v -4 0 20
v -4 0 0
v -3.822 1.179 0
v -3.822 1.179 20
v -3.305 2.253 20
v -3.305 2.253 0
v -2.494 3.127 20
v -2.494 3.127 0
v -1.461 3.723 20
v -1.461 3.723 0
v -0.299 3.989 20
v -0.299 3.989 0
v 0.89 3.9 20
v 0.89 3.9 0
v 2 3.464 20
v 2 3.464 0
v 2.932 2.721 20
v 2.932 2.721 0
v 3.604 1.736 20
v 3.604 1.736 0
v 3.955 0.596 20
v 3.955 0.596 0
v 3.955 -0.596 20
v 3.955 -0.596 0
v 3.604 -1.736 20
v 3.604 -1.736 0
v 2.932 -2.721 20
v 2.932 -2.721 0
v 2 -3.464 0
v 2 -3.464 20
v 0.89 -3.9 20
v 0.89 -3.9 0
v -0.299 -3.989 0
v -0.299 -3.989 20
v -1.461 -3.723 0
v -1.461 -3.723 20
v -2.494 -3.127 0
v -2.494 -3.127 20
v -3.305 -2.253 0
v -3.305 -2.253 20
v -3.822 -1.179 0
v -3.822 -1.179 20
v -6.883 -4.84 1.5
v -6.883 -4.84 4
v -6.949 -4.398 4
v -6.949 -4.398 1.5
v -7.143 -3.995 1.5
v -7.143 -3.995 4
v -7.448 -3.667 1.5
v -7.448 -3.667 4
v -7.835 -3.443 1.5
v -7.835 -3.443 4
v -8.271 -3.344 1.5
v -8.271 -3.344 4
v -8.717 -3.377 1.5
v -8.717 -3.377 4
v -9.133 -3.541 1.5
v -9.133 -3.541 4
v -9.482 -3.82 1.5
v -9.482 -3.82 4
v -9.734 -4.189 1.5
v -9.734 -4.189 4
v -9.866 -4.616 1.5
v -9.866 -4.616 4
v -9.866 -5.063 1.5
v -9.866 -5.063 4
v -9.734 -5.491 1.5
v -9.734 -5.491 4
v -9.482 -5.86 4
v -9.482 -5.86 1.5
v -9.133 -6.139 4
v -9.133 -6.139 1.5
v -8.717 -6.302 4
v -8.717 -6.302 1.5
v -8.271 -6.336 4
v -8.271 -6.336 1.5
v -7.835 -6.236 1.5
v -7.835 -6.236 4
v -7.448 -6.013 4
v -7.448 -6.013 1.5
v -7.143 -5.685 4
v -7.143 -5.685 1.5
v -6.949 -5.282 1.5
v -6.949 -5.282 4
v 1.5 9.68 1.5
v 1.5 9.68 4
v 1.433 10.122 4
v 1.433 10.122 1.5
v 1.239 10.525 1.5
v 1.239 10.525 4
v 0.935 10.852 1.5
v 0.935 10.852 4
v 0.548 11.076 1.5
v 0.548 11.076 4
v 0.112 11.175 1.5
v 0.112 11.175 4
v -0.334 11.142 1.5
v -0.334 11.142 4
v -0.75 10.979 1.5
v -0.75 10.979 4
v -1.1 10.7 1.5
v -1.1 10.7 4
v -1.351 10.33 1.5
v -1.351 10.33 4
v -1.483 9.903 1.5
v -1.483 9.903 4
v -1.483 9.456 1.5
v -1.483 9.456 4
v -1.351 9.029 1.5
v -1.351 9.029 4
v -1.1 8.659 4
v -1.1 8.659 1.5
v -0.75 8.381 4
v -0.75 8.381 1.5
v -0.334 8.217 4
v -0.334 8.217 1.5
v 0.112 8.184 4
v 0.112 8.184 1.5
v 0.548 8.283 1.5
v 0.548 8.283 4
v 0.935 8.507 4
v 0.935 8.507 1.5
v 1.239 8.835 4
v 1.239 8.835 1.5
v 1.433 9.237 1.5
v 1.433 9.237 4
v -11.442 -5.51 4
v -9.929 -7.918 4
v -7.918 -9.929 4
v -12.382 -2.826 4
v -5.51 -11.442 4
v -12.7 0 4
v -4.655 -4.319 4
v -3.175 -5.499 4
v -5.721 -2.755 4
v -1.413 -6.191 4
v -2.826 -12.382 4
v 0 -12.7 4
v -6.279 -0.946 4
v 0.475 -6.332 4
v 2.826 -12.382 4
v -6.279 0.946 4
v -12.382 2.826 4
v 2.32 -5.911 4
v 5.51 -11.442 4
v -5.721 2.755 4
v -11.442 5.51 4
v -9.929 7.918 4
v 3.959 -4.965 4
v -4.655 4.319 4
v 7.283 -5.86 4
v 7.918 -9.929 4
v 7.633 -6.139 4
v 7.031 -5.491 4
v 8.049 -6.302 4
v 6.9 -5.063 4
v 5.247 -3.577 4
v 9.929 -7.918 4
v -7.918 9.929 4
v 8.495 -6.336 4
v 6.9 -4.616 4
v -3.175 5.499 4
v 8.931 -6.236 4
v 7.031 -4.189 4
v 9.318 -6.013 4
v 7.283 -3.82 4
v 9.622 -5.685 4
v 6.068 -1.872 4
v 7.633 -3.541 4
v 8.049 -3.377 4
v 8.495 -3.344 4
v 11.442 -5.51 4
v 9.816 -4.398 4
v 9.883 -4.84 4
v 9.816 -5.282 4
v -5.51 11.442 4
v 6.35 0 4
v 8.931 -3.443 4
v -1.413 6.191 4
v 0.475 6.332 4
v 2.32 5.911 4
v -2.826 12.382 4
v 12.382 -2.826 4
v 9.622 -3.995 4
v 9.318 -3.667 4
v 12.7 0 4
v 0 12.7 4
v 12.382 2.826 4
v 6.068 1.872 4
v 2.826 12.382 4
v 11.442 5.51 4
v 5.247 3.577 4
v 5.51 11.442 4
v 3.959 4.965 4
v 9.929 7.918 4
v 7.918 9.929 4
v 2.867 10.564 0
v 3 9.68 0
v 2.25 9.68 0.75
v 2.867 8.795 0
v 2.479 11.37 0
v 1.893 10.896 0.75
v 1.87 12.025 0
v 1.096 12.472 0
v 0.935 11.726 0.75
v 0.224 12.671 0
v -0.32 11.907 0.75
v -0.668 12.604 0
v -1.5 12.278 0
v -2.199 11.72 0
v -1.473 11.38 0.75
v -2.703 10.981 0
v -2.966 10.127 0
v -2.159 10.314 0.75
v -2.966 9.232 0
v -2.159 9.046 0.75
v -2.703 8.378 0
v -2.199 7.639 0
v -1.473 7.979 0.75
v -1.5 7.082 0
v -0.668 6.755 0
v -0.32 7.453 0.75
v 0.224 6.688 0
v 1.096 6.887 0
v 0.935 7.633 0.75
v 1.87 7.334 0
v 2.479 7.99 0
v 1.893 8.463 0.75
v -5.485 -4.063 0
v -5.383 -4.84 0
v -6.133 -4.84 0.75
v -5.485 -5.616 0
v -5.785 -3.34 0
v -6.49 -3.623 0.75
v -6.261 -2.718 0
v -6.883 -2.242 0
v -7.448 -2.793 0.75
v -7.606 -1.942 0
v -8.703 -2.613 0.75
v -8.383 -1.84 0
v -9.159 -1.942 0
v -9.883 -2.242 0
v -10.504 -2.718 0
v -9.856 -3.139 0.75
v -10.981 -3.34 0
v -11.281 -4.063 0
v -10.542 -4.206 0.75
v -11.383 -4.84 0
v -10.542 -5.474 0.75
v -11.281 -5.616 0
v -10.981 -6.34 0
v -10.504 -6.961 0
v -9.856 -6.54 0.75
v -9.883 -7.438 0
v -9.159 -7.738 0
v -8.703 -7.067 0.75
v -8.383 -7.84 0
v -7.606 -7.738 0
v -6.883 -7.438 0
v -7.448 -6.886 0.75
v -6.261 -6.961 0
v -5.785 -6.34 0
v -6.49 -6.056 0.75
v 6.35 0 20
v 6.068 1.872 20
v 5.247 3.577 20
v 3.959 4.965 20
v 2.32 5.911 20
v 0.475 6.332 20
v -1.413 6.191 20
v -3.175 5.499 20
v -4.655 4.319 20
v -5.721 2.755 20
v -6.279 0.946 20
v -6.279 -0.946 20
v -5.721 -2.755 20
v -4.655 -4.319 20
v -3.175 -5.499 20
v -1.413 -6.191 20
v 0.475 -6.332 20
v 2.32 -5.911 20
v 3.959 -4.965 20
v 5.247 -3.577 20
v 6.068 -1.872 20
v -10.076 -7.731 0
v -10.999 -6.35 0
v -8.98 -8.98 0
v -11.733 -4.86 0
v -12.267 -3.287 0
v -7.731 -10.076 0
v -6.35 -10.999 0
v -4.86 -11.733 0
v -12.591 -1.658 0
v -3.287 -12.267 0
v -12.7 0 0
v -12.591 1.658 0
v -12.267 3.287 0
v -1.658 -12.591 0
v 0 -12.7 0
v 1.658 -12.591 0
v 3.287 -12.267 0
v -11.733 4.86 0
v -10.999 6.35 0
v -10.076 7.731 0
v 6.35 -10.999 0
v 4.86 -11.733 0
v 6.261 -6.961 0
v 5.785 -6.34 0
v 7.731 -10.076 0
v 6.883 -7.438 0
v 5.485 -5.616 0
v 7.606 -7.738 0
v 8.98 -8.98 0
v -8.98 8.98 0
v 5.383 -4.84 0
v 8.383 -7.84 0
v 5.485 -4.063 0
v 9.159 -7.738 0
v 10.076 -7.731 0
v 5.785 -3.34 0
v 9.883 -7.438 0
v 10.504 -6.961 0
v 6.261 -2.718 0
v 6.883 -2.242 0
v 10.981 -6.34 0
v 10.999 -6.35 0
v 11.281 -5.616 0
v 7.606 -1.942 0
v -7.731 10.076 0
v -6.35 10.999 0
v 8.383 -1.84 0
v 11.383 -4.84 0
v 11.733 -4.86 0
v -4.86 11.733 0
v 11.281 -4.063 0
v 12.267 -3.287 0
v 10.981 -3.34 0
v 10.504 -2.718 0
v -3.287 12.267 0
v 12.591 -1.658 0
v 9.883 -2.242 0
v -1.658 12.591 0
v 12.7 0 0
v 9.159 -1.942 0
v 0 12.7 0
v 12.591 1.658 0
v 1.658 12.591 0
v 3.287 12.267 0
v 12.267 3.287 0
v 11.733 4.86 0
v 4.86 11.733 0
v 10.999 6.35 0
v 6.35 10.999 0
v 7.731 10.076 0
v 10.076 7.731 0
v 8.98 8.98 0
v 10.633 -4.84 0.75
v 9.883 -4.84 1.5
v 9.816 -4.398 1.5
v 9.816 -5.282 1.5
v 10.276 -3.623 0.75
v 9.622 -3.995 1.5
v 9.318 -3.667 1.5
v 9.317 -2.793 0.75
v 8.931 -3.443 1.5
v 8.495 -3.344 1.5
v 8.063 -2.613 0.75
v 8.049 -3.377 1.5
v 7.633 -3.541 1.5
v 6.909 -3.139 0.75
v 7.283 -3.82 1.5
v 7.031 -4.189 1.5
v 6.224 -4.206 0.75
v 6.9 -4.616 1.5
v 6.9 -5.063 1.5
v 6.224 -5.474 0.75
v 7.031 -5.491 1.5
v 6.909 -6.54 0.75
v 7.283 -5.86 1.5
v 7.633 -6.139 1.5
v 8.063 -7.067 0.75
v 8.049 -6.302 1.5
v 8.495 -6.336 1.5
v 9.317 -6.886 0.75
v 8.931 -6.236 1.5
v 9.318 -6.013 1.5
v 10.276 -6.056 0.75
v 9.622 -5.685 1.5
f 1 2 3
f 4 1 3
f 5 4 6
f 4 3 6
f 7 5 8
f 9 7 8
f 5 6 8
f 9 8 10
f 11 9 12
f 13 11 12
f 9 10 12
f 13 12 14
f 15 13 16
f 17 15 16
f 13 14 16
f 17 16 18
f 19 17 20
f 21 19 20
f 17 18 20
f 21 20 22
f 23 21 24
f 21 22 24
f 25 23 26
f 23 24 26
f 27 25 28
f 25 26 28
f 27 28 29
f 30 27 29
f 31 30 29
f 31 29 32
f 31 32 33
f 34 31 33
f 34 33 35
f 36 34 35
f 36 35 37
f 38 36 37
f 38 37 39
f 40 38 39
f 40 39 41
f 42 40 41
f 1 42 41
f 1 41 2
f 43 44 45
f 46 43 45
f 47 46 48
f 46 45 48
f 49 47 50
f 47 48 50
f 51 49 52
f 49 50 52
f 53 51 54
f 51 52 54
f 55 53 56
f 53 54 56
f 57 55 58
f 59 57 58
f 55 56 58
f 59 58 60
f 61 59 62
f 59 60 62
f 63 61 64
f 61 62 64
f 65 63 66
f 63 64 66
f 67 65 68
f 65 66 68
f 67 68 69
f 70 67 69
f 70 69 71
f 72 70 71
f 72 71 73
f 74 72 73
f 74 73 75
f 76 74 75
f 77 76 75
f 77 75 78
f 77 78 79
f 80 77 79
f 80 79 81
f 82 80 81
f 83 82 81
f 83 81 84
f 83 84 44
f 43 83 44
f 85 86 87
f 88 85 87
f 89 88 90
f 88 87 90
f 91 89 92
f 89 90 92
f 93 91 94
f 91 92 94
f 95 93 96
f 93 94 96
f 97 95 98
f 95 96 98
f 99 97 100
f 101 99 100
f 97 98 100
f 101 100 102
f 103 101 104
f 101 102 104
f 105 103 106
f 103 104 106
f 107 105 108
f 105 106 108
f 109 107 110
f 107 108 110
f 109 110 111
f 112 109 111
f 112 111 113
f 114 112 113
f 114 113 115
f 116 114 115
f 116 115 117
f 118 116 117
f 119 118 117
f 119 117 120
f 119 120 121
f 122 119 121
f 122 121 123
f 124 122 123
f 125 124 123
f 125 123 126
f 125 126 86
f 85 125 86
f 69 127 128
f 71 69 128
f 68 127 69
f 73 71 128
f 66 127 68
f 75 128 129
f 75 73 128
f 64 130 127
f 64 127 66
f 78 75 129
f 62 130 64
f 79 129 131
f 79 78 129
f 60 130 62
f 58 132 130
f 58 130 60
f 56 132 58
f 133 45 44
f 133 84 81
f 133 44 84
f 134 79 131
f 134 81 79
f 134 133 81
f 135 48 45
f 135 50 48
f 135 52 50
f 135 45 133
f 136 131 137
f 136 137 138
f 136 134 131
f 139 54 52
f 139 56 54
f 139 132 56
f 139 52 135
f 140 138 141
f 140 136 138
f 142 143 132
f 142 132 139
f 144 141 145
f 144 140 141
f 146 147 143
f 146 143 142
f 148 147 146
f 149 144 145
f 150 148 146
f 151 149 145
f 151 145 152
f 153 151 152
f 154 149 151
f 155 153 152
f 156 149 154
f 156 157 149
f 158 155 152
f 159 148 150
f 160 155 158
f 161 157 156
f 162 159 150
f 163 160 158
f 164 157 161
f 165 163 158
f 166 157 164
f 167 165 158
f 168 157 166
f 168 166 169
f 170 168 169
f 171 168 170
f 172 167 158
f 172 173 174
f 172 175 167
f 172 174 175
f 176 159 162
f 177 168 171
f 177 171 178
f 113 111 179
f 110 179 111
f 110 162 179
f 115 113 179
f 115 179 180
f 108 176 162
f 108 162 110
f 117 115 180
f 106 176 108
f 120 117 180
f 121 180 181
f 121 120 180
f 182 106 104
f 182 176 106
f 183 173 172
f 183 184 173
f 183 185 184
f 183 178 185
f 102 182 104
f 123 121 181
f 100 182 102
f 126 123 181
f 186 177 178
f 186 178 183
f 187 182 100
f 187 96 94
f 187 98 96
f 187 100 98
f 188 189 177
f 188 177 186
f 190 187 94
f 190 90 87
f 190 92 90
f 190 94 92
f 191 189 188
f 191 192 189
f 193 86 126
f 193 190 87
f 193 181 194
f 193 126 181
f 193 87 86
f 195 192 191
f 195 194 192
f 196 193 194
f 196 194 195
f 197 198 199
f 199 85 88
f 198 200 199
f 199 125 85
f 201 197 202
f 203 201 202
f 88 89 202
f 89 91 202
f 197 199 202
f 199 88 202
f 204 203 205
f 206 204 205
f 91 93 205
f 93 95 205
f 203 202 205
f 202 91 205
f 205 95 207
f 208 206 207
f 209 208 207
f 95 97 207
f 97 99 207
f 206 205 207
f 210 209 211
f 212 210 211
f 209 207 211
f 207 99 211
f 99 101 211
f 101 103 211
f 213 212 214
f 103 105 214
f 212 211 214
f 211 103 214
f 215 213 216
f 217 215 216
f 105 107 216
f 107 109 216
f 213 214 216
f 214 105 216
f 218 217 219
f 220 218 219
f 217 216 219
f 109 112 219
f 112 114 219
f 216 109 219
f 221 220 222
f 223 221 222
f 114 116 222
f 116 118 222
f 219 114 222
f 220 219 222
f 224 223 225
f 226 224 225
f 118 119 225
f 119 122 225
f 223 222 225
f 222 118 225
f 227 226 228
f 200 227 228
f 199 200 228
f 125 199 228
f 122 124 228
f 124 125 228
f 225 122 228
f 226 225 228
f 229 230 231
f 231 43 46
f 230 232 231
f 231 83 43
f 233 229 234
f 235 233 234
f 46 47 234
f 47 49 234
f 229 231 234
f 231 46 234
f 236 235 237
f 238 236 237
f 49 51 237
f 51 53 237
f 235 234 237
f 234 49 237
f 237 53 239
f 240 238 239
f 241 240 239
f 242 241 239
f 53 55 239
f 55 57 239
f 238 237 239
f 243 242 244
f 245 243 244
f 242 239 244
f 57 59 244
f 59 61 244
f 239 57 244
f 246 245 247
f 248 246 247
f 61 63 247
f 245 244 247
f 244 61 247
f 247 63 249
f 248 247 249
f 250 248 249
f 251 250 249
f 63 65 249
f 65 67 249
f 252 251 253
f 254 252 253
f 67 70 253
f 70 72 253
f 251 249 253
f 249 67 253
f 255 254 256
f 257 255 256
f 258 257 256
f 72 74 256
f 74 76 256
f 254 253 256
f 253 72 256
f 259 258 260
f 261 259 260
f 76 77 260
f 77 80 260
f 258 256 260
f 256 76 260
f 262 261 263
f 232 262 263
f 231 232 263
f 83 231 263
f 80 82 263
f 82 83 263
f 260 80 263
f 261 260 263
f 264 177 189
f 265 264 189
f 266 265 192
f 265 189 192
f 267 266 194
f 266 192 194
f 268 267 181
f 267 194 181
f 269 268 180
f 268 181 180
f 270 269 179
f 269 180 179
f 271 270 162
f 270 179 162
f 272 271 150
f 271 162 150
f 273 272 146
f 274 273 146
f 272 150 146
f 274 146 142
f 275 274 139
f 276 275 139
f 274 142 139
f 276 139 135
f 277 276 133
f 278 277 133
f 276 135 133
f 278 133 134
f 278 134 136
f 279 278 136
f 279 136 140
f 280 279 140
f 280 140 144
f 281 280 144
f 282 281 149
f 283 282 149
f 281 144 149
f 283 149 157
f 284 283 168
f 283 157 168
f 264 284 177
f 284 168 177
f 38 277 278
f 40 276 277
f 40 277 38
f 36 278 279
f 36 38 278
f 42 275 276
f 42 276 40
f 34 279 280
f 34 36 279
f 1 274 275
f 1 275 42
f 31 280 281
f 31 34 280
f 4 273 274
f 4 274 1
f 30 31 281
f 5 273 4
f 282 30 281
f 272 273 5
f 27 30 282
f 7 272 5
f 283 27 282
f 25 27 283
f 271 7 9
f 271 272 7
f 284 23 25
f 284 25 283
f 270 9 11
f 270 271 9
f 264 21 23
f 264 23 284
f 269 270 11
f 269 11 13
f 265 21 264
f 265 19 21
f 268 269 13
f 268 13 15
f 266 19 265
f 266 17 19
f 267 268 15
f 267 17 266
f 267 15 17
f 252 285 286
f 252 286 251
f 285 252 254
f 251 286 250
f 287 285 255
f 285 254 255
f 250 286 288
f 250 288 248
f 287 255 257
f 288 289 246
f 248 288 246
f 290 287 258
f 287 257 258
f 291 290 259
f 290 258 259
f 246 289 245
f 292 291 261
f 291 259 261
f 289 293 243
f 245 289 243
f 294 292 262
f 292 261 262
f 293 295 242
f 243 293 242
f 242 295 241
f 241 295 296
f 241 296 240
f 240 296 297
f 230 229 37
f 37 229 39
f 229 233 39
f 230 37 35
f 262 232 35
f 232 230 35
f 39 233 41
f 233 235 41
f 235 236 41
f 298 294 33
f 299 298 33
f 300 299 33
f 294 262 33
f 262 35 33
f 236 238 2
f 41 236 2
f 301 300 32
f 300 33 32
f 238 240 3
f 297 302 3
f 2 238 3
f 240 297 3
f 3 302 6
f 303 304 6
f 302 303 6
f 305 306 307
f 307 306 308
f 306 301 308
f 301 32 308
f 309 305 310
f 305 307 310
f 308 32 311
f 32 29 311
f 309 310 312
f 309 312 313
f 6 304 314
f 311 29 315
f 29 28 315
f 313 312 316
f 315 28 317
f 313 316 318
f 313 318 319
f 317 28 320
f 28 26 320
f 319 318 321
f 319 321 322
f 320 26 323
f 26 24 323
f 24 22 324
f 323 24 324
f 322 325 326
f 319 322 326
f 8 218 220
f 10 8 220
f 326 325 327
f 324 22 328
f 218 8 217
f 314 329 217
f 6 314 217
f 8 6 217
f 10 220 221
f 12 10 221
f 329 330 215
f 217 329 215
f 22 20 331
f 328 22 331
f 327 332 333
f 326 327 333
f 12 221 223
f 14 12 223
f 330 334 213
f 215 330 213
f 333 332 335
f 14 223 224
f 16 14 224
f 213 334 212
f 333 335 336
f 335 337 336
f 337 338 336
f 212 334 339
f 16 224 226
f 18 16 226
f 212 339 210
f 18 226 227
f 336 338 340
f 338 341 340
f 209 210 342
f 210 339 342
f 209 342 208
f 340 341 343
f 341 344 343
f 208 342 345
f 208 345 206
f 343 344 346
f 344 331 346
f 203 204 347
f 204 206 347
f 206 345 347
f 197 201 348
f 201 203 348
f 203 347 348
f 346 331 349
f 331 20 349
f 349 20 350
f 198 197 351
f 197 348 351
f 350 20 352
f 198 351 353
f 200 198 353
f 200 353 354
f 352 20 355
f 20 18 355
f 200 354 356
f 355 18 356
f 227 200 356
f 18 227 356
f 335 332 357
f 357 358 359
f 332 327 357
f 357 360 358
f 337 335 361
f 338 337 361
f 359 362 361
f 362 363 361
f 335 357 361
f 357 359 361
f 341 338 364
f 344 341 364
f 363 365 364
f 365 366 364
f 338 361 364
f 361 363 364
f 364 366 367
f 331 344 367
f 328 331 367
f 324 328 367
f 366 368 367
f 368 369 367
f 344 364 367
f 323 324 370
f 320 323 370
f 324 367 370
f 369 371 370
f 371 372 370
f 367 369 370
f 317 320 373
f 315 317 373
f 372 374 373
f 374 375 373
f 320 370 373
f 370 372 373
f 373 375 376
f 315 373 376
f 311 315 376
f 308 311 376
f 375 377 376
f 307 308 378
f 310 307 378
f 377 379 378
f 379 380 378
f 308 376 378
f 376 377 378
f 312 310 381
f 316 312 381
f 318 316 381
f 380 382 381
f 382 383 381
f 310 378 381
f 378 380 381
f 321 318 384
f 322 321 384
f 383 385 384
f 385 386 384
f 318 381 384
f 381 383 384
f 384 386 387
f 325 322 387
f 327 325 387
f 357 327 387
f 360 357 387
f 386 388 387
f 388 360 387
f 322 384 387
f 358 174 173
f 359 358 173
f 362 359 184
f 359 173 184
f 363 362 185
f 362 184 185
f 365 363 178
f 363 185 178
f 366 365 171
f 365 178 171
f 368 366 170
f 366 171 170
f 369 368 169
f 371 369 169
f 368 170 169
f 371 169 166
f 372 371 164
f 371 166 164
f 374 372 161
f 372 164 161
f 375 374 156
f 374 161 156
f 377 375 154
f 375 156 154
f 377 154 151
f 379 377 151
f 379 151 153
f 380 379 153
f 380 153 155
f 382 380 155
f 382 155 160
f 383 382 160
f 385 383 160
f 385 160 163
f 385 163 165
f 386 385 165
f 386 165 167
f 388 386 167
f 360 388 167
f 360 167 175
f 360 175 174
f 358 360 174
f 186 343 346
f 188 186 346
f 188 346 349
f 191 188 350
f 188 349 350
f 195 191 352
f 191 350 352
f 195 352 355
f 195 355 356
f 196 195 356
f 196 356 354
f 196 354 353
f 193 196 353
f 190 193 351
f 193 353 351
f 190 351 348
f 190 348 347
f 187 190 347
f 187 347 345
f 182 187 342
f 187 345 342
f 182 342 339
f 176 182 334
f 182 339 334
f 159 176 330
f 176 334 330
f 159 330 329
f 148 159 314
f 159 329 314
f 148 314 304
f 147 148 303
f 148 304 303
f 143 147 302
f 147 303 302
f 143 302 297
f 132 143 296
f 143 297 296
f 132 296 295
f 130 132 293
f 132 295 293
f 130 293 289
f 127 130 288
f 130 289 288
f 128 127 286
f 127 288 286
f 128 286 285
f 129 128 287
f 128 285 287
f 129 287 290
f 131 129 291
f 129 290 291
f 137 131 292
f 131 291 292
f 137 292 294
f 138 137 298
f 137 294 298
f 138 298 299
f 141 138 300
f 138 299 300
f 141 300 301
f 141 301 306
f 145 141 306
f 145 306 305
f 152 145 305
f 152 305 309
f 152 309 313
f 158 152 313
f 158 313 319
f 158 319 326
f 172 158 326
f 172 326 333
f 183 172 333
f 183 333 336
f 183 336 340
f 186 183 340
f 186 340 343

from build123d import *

# Parameters (mm, degrees)
SKETCH1_R           = 12.7
BOSS_EXTRUDE1_DEPTH = 4
SKETCH2_R           = 6.35
BOSS_EXTRUDE2_DEPTH = 16
SKETCH3_R           = 4
CUT_EXTRUDE1_DEPTH  = 27.880848201
SKETCH4_R           = 1.5
CUT_EXTRUDE2_DEPTH  = 25.053689946
CHAMFER1_SIZE       = 1.5


with BuildPart() as part:
    # Sketch1 → Boss-Extrude1 (new body)
    with BuildSketch(Plane.XY):
        Circle(SKETCH1_R)
    extrude(amount=BOSS_EXTRUDE1_DEPTH)

    # Sketch2 → Boss-Extrude2 (add)
    with BuildSketch(Plane.XY.offset(4)):
        Circle(SKETCH2_R)
    extrude(amount=BOSS_EXTRUDE2_DEPTH)

    # Sketch3 → Cut-Extrude1 (cut, through all)
    with BuildSketch(Plane(origin=(0, 0, 0), x_dir=(-1, 0, 0), z_dir=(0, 0, -1))):
        Circle(SKETCH3_R)
    extrude(amount=-CUT_EXTRUDE1_DEPTH, mode=Mode.SUBTRACT)

    # Sketch4 → Cut-Extrude2 (cut, through all)
    with BuildSketch(Plane.XY.offset(4)):
        with Locations((0, 9.679602242)):
            Circle(SKETCH4_R)
        with Locations((8.38278144, -4.839801121)):
            Circle(SKETCH4_R)
        with Locations((-8.38278144, -4.839801121)):
            Circle(SKETCH4_R)
    extrude(amount=-CUT_EXTRUDE2_DEPTH, mode=Mode.SUBTRACT)

    # Chamfer1
    chamfer1_edges = [part.edges().sort_by_distance(p)[0] for p in [
        (-1.5, 9.679602242, 0),
        (6.88278144, -4.839801121, 0),
        (-9.88278144, -4.839801121, 0),
    ]]
    chamfer(chamfer1_edges, length=CHAMFER1_SIZE)


solid = part.part
